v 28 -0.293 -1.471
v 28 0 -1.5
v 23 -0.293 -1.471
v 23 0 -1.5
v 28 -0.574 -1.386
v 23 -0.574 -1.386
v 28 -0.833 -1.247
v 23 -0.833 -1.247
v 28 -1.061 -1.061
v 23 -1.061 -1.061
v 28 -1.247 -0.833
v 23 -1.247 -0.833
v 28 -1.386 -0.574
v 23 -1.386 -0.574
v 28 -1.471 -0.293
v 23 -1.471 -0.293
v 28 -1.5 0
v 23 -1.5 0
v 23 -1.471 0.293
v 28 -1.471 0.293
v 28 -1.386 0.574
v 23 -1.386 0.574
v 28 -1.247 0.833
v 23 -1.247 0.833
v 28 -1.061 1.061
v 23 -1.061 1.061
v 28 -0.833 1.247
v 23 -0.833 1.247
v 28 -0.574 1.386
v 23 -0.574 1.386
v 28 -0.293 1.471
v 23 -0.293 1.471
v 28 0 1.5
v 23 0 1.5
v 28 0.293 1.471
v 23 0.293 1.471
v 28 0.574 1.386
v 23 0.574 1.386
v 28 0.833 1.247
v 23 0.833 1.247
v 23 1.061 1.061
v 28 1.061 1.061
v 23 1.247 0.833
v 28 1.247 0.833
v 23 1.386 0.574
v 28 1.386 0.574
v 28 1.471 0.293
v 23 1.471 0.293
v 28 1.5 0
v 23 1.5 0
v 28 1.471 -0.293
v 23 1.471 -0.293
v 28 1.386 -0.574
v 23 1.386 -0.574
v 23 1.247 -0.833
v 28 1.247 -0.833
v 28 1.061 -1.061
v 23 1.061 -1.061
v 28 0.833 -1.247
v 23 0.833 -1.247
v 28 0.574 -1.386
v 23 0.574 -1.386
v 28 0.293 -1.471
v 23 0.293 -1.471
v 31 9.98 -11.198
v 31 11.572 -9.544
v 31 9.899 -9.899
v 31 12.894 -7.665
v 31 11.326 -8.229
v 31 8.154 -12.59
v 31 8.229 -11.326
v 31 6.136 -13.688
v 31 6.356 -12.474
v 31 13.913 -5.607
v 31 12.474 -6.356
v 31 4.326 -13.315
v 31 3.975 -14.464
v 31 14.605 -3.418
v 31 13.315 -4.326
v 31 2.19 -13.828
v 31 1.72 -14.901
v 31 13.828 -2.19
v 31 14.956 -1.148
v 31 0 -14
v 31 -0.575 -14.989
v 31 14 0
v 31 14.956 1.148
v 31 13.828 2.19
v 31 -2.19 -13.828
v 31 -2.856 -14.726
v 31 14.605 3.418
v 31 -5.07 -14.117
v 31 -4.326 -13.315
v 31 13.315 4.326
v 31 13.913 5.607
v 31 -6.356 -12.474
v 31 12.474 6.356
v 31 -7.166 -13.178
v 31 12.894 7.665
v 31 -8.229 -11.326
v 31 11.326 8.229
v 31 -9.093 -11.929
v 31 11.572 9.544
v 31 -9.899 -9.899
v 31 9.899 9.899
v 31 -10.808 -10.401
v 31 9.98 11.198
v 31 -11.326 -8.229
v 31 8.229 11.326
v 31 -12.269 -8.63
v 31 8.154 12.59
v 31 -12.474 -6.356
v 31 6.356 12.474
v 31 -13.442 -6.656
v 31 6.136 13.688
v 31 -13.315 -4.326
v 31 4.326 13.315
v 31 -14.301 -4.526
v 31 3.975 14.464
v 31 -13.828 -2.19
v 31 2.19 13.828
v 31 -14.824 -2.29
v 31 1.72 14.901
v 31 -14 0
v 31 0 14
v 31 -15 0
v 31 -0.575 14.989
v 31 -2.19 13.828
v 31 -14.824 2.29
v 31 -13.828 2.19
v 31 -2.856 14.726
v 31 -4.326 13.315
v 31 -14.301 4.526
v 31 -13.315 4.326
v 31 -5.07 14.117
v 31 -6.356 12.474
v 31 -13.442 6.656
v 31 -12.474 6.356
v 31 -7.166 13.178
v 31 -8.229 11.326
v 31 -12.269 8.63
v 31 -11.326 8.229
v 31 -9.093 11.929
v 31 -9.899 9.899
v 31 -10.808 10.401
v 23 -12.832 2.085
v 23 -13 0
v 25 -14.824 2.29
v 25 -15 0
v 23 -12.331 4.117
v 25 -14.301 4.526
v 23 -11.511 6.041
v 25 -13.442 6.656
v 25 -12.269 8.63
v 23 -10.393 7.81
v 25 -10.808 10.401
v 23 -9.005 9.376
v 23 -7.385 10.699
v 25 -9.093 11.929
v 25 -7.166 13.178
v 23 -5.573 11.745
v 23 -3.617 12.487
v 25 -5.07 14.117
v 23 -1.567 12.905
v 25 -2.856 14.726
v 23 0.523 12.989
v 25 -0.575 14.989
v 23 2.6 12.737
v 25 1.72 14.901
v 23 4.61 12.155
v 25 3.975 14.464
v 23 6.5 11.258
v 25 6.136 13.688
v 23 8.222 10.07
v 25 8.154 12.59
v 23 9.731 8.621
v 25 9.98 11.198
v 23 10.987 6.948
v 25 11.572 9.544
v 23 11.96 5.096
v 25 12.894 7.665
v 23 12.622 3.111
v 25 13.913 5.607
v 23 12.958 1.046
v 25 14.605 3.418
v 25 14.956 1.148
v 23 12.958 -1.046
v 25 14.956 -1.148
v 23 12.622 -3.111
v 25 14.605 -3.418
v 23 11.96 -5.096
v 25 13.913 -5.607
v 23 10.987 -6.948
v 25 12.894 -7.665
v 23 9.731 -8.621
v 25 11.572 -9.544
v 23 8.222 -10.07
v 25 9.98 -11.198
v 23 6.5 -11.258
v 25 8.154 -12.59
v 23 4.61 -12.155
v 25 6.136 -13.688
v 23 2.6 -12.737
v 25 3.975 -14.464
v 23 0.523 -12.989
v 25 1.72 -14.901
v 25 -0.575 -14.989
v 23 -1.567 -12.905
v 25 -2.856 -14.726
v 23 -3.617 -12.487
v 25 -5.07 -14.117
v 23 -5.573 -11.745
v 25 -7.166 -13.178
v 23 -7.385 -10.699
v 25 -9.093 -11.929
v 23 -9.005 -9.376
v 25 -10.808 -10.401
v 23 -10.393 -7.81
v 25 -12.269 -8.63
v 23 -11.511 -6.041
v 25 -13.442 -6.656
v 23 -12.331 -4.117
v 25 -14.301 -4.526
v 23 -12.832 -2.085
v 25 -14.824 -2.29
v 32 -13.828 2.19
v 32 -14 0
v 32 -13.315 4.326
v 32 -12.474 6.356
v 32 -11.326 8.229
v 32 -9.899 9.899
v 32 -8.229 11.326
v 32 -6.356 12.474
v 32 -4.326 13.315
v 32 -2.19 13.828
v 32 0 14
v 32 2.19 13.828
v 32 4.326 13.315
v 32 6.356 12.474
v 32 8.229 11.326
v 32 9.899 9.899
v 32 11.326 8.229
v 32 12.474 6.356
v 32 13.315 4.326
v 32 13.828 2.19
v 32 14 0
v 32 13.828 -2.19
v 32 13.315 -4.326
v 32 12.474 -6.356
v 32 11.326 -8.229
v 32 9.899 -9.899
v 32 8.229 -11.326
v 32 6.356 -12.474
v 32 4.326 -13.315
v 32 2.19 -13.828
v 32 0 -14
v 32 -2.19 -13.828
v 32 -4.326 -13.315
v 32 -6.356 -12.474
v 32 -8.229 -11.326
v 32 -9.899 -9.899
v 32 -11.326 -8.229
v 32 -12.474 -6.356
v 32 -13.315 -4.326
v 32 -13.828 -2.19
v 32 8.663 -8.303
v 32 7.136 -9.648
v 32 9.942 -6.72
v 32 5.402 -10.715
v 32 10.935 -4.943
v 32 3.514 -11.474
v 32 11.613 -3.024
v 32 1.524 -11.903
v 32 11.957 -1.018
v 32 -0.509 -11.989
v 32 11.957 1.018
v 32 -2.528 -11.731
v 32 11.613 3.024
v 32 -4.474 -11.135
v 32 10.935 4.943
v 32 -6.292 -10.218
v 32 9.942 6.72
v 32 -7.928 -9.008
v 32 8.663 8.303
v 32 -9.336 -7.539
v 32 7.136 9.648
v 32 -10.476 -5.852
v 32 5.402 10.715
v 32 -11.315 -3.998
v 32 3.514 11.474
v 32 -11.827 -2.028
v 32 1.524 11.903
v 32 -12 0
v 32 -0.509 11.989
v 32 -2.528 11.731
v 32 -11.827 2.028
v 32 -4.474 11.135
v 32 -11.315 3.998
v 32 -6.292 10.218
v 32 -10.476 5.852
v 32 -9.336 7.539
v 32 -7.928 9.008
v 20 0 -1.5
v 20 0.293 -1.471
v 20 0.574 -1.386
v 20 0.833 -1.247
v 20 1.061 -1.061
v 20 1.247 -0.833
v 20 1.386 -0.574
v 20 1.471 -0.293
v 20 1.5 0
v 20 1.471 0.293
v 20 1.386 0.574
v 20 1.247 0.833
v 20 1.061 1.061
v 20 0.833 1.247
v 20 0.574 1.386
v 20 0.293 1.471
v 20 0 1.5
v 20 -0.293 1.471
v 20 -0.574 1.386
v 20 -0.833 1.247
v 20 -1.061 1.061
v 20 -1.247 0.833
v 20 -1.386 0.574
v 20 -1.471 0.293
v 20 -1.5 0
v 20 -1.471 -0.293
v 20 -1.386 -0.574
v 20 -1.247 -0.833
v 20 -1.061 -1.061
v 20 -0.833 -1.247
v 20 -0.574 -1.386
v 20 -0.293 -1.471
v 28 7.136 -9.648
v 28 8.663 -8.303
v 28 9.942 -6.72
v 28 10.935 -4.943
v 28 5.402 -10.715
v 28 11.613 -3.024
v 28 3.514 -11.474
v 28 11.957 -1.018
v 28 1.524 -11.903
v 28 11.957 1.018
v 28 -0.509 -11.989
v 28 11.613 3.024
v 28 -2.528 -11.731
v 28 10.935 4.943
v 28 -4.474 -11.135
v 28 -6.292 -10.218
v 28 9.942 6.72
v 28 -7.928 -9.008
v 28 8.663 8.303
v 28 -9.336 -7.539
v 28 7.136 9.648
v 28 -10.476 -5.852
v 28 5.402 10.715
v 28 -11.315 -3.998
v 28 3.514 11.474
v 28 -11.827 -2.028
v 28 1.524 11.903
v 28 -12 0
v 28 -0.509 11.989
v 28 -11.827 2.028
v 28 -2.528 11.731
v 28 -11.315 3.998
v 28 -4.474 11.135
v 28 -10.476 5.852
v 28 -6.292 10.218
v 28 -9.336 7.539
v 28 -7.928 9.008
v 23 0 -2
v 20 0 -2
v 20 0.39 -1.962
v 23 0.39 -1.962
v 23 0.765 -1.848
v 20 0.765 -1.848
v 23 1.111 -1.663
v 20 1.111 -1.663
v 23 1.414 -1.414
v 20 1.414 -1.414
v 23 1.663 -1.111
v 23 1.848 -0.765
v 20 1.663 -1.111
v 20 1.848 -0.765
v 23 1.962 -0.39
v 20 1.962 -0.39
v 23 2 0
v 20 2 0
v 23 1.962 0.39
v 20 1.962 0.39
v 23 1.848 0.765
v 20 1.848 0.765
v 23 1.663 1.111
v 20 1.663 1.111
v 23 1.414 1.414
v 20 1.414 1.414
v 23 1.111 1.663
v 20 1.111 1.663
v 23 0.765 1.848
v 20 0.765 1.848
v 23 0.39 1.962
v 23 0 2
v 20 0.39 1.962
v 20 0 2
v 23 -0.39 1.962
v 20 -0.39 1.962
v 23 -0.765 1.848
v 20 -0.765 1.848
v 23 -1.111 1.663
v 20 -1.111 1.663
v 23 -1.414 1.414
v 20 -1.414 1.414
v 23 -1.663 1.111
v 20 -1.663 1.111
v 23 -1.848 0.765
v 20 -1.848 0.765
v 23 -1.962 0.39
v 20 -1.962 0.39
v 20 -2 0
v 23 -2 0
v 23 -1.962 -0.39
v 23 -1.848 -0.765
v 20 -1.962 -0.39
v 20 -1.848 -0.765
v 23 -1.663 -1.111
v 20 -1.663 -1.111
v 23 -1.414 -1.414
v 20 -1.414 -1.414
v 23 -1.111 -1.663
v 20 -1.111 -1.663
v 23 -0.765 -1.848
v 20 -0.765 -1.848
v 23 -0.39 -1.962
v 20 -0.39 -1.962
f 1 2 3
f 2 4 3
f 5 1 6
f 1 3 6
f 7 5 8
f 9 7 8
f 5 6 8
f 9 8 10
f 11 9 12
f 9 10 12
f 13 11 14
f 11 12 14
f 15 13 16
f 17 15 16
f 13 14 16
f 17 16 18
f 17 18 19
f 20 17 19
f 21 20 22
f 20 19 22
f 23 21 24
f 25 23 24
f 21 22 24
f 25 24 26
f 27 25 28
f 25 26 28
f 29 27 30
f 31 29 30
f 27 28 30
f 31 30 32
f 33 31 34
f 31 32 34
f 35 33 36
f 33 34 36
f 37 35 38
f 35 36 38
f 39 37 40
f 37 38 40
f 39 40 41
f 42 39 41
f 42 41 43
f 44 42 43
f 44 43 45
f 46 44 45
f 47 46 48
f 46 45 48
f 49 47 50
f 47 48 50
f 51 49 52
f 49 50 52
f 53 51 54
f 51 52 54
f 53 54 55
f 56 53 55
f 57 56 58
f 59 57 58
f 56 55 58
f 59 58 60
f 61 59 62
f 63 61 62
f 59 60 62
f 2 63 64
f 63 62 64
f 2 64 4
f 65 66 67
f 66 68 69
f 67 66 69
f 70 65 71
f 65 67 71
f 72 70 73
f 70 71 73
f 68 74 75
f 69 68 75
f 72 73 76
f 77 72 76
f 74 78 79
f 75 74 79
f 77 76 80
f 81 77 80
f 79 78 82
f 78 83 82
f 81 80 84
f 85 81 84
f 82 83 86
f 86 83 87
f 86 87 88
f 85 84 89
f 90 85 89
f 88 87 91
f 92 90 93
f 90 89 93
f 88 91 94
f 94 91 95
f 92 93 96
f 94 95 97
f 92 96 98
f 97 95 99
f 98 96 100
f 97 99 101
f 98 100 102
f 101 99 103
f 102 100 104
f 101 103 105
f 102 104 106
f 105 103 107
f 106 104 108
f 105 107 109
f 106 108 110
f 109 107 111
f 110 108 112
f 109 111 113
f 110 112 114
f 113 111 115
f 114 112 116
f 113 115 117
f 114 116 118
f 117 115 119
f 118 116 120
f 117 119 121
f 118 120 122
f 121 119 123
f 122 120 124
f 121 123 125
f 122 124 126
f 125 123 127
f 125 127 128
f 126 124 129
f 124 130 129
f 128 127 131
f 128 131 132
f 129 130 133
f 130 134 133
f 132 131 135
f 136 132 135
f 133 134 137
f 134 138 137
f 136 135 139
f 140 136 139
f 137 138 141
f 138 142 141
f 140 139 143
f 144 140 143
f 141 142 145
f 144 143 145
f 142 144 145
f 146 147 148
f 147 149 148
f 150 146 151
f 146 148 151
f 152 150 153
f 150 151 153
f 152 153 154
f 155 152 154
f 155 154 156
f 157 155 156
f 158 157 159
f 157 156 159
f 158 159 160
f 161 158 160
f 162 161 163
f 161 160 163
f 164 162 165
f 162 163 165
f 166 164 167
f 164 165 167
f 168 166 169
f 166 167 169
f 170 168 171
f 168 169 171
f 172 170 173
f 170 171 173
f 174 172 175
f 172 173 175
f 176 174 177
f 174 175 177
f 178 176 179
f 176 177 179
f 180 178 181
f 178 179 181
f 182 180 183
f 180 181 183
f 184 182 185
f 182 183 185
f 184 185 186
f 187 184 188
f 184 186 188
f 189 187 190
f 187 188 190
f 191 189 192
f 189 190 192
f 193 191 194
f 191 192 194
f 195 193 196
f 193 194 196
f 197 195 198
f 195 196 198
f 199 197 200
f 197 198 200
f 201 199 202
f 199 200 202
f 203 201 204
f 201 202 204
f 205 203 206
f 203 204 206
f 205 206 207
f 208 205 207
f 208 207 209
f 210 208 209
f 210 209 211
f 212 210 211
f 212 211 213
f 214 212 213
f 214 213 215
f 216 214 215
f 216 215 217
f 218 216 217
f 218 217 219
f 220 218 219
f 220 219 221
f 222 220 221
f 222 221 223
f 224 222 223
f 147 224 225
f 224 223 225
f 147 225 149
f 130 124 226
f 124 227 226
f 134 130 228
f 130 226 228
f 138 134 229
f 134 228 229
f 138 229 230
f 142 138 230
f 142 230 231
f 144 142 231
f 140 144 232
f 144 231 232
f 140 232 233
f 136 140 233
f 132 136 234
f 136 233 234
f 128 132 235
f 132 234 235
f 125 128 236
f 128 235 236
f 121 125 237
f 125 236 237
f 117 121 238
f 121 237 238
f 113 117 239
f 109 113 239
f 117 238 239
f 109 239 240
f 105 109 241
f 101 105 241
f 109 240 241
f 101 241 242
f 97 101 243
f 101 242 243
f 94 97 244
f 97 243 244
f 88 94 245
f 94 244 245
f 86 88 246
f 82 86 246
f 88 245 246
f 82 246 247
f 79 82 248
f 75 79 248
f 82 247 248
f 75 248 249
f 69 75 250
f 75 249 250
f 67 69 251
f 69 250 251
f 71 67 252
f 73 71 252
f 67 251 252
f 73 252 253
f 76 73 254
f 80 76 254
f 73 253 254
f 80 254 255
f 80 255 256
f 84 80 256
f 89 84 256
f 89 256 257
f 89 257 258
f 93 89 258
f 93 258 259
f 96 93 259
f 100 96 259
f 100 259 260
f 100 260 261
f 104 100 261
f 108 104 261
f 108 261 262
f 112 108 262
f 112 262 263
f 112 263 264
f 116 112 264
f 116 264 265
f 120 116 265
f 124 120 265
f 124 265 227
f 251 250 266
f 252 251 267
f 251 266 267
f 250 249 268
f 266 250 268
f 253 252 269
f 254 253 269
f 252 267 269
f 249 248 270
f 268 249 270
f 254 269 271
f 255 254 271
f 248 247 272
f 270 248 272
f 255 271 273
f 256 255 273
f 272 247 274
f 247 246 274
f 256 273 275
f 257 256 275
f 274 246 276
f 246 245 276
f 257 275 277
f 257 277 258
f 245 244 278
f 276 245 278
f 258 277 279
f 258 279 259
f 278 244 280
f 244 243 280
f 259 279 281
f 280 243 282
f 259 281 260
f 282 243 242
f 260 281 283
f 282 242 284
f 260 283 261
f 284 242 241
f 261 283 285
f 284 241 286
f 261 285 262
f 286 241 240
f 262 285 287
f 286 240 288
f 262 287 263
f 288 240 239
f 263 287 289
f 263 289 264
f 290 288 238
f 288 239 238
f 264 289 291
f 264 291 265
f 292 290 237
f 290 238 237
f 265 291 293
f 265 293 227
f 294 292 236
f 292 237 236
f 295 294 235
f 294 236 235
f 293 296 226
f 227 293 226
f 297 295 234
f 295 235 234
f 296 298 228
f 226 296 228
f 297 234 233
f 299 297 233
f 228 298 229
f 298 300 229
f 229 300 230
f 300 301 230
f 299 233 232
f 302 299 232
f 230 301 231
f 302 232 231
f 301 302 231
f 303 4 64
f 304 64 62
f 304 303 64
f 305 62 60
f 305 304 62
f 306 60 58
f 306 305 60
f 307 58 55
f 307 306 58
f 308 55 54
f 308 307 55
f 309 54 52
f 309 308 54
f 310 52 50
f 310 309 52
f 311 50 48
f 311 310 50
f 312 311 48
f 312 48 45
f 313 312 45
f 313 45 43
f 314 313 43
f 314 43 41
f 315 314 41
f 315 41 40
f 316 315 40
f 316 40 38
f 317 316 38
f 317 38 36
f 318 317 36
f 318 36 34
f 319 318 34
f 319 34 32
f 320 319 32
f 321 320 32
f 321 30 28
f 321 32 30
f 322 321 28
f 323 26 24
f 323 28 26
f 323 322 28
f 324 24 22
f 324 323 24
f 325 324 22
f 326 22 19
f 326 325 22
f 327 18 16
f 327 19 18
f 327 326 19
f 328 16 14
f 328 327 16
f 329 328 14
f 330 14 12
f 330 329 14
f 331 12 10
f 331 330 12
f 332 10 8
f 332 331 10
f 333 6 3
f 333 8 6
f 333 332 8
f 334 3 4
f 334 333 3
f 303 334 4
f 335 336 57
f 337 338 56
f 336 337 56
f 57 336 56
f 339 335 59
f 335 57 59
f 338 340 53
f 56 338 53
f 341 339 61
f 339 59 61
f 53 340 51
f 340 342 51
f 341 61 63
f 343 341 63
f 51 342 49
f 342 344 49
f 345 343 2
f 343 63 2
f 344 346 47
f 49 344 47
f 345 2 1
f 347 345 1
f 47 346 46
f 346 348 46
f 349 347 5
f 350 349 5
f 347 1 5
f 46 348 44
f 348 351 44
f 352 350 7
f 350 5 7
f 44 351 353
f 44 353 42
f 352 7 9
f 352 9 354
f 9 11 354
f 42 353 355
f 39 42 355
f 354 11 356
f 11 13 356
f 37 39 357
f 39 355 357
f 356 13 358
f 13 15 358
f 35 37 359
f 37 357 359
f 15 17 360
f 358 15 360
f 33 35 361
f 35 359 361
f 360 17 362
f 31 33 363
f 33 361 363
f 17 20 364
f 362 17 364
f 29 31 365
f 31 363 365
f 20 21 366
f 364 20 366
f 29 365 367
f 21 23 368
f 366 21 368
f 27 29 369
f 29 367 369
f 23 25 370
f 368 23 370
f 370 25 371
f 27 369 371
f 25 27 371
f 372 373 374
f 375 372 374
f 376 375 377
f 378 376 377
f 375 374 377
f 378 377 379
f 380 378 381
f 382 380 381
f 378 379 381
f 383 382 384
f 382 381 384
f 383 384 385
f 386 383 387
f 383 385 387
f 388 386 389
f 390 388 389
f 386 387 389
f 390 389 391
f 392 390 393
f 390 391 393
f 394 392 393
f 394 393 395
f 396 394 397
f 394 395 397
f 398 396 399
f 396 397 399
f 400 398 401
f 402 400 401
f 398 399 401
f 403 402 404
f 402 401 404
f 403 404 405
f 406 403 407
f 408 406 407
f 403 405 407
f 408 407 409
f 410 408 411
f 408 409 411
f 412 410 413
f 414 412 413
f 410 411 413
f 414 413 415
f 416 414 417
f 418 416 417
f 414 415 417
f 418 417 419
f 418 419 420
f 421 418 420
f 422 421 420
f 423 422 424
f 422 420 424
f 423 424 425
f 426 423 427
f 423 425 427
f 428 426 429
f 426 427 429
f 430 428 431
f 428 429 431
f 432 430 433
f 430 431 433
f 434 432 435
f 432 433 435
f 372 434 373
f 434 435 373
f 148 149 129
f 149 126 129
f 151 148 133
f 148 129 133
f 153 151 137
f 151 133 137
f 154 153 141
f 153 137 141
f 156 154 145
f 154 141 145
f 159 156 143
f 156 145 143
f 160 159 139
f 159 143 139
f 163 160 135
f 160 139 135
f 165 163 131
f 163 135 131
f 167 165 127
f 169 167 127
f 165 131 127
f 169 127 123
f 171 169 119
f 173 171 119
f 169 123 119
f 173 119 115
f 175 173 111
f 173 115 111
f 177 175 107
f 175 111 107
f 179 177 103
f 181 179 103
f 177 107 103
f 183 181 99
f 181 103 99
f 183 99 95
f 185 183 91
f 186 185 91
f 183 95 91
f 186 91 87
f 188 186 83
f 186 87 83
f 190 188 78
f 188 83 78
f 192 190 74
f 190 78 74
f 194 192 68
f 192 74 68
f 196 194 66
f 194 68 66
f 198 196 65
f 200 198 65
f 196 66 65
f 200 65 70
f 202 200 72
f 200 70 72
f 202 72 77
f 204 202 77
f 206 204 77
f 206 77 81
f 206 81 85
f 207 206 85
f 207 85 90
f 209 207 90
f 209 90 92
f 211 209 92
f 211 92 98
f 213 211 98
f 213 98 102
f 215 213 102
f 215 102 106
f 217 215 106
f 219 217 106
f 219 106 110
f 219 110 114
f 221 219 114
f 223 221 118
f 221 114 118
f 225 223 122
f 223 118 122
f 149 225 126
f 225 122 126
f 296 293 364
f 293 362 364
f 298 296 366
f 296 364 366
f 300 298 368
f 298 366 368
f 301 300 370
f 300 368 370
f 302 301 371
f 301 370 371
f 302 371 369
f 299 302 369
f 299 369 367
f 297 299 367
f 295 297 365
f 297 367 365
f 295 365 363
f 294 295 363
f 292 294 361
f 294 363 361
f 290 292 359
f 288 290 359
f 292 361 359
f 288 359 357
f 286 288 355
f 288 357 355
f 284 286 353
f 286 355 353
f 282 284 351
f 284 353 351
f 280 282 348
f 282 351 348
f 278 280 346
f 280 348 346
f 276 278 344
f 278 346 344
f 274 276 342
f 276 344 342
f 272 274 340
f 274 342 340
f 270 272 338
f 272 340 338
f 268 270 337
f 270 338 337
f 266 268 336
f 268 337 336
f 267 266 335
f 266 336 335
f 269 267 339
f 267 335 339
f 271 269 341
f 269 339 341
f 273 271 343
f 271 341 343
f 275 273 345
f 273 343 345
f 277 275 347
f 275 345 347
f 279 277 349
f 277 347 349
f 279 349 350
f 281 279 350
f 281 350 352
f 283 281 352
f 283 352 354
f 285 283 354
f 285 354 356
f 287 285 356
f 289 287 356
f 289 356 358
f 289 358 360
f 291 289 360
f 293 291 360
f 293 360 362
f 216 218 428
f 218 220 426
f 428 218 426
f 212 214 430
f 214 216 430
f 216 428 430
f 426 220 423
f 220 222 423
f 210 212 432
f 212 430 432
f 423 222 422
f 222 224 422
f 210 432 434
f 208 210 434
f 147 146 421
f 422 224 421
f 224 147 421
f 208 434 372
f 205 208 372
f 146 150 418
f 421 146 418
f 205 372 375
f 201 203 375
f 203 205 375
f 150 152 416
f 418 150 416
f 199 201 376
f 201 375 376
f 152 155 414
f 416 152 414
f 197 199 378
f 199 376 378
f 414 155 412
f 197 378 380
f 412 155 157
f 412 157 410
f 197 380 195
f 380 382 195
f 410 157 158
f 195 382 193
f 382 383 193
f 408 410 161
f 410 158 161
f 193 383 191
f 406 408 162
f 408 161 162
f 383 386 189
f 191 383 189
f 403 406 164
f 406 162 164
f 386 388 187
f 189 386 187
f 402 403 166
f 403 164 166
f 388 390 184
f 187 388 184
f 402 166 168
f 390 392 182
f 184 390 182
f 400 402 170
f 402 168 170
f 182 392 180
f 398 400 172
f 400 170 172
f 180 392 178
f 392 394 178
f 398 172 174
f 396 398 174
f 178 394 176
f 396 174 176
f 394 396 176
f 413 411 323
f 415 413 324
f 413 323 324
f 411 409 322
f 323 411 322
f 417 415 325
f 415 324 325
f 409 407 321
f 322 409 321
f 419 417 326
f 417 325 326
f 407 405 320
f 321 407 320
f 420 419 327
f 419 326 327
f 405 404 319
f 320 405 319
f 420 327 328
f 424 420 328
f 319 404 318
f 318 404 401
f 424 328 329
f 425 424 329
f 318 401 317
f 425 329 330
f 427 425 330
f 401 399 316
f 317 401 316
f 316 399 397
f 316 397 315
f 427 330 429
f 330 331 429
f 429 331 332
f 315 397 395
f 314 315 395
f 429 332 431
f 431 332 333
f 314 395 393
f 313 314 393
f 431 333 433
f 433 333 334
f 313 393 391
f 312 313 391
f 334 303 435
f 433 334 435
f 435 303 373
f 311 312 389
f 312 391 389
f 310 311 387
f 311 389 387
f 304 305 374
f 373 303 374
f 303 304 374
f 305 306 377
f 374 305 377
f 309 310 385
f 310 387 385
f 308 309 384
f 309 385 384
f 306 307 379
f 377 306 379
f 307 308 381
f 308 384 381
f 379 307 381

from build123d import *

# Parameters (mm, degrees)
CYLINDER003_R           = 1.5
CYLINDER003_DEPTH       = 22
BODY002_PLACEMENT_ANGLE = 180
CYLINDER002_R           = 2
CYLINDER002_DEPTH       = 3


with BuildPart() as cylinder003:
    # Cylinder003 → Cylinder003 (new body)
    with BuildSketch(Plane(origin=(18, 0, 0), x_dir=(0, 0, -1), z_dir=(1, 0, 0))):
        Circle(CYLINDER003_R)
    extrude(amount=CYLINDER003_DEPTH)


with BuildPart() as body002:
    # Sketch002 → Revolution002 (revolve)
    with BuildSketch(Plane.XY):
        Polygon((0, 1.5), (0, 13), (-2, 15), (-8, 15), (-8, 14), (-9, 14), (-9, 12), (-5, 12), (-5, 1.5), align=None)
    revolve(axis=Axis((0, 0, 0), (1, 0, 0)))


with BuildPart() as body002_1:
    # Body002 placement: moved
    add(body002.part.moved(Location((12, 0, 0))).rotate(Axis((12, 0, 0), (0, 0, 1)), BODY002_PLACEMENT_ANGLE))


with BuildPart() as cut:
    # Cylinder002 → Cylinder002 (new body)
    with BuildSketch(Plane(origin=(9, 0, 0), x_dir=(0, 0, -1), z_dir=(1, 0, 0))):
        Circle(CYLINDER002_R)
    extrude(amount=CYLINDER002_DEPTH)

    # Fusion: union Body002
    add(body002_1.part)


with BuildPart() as cut_1:
    # Fusion placement: moved
    add(cut.part.moved(Location((11, 0, 0))))

    # Cut: cut Cylinder003
    add(cylinder003.part, mode=Mode.SUBTRACT)


solid = cut_1.part
